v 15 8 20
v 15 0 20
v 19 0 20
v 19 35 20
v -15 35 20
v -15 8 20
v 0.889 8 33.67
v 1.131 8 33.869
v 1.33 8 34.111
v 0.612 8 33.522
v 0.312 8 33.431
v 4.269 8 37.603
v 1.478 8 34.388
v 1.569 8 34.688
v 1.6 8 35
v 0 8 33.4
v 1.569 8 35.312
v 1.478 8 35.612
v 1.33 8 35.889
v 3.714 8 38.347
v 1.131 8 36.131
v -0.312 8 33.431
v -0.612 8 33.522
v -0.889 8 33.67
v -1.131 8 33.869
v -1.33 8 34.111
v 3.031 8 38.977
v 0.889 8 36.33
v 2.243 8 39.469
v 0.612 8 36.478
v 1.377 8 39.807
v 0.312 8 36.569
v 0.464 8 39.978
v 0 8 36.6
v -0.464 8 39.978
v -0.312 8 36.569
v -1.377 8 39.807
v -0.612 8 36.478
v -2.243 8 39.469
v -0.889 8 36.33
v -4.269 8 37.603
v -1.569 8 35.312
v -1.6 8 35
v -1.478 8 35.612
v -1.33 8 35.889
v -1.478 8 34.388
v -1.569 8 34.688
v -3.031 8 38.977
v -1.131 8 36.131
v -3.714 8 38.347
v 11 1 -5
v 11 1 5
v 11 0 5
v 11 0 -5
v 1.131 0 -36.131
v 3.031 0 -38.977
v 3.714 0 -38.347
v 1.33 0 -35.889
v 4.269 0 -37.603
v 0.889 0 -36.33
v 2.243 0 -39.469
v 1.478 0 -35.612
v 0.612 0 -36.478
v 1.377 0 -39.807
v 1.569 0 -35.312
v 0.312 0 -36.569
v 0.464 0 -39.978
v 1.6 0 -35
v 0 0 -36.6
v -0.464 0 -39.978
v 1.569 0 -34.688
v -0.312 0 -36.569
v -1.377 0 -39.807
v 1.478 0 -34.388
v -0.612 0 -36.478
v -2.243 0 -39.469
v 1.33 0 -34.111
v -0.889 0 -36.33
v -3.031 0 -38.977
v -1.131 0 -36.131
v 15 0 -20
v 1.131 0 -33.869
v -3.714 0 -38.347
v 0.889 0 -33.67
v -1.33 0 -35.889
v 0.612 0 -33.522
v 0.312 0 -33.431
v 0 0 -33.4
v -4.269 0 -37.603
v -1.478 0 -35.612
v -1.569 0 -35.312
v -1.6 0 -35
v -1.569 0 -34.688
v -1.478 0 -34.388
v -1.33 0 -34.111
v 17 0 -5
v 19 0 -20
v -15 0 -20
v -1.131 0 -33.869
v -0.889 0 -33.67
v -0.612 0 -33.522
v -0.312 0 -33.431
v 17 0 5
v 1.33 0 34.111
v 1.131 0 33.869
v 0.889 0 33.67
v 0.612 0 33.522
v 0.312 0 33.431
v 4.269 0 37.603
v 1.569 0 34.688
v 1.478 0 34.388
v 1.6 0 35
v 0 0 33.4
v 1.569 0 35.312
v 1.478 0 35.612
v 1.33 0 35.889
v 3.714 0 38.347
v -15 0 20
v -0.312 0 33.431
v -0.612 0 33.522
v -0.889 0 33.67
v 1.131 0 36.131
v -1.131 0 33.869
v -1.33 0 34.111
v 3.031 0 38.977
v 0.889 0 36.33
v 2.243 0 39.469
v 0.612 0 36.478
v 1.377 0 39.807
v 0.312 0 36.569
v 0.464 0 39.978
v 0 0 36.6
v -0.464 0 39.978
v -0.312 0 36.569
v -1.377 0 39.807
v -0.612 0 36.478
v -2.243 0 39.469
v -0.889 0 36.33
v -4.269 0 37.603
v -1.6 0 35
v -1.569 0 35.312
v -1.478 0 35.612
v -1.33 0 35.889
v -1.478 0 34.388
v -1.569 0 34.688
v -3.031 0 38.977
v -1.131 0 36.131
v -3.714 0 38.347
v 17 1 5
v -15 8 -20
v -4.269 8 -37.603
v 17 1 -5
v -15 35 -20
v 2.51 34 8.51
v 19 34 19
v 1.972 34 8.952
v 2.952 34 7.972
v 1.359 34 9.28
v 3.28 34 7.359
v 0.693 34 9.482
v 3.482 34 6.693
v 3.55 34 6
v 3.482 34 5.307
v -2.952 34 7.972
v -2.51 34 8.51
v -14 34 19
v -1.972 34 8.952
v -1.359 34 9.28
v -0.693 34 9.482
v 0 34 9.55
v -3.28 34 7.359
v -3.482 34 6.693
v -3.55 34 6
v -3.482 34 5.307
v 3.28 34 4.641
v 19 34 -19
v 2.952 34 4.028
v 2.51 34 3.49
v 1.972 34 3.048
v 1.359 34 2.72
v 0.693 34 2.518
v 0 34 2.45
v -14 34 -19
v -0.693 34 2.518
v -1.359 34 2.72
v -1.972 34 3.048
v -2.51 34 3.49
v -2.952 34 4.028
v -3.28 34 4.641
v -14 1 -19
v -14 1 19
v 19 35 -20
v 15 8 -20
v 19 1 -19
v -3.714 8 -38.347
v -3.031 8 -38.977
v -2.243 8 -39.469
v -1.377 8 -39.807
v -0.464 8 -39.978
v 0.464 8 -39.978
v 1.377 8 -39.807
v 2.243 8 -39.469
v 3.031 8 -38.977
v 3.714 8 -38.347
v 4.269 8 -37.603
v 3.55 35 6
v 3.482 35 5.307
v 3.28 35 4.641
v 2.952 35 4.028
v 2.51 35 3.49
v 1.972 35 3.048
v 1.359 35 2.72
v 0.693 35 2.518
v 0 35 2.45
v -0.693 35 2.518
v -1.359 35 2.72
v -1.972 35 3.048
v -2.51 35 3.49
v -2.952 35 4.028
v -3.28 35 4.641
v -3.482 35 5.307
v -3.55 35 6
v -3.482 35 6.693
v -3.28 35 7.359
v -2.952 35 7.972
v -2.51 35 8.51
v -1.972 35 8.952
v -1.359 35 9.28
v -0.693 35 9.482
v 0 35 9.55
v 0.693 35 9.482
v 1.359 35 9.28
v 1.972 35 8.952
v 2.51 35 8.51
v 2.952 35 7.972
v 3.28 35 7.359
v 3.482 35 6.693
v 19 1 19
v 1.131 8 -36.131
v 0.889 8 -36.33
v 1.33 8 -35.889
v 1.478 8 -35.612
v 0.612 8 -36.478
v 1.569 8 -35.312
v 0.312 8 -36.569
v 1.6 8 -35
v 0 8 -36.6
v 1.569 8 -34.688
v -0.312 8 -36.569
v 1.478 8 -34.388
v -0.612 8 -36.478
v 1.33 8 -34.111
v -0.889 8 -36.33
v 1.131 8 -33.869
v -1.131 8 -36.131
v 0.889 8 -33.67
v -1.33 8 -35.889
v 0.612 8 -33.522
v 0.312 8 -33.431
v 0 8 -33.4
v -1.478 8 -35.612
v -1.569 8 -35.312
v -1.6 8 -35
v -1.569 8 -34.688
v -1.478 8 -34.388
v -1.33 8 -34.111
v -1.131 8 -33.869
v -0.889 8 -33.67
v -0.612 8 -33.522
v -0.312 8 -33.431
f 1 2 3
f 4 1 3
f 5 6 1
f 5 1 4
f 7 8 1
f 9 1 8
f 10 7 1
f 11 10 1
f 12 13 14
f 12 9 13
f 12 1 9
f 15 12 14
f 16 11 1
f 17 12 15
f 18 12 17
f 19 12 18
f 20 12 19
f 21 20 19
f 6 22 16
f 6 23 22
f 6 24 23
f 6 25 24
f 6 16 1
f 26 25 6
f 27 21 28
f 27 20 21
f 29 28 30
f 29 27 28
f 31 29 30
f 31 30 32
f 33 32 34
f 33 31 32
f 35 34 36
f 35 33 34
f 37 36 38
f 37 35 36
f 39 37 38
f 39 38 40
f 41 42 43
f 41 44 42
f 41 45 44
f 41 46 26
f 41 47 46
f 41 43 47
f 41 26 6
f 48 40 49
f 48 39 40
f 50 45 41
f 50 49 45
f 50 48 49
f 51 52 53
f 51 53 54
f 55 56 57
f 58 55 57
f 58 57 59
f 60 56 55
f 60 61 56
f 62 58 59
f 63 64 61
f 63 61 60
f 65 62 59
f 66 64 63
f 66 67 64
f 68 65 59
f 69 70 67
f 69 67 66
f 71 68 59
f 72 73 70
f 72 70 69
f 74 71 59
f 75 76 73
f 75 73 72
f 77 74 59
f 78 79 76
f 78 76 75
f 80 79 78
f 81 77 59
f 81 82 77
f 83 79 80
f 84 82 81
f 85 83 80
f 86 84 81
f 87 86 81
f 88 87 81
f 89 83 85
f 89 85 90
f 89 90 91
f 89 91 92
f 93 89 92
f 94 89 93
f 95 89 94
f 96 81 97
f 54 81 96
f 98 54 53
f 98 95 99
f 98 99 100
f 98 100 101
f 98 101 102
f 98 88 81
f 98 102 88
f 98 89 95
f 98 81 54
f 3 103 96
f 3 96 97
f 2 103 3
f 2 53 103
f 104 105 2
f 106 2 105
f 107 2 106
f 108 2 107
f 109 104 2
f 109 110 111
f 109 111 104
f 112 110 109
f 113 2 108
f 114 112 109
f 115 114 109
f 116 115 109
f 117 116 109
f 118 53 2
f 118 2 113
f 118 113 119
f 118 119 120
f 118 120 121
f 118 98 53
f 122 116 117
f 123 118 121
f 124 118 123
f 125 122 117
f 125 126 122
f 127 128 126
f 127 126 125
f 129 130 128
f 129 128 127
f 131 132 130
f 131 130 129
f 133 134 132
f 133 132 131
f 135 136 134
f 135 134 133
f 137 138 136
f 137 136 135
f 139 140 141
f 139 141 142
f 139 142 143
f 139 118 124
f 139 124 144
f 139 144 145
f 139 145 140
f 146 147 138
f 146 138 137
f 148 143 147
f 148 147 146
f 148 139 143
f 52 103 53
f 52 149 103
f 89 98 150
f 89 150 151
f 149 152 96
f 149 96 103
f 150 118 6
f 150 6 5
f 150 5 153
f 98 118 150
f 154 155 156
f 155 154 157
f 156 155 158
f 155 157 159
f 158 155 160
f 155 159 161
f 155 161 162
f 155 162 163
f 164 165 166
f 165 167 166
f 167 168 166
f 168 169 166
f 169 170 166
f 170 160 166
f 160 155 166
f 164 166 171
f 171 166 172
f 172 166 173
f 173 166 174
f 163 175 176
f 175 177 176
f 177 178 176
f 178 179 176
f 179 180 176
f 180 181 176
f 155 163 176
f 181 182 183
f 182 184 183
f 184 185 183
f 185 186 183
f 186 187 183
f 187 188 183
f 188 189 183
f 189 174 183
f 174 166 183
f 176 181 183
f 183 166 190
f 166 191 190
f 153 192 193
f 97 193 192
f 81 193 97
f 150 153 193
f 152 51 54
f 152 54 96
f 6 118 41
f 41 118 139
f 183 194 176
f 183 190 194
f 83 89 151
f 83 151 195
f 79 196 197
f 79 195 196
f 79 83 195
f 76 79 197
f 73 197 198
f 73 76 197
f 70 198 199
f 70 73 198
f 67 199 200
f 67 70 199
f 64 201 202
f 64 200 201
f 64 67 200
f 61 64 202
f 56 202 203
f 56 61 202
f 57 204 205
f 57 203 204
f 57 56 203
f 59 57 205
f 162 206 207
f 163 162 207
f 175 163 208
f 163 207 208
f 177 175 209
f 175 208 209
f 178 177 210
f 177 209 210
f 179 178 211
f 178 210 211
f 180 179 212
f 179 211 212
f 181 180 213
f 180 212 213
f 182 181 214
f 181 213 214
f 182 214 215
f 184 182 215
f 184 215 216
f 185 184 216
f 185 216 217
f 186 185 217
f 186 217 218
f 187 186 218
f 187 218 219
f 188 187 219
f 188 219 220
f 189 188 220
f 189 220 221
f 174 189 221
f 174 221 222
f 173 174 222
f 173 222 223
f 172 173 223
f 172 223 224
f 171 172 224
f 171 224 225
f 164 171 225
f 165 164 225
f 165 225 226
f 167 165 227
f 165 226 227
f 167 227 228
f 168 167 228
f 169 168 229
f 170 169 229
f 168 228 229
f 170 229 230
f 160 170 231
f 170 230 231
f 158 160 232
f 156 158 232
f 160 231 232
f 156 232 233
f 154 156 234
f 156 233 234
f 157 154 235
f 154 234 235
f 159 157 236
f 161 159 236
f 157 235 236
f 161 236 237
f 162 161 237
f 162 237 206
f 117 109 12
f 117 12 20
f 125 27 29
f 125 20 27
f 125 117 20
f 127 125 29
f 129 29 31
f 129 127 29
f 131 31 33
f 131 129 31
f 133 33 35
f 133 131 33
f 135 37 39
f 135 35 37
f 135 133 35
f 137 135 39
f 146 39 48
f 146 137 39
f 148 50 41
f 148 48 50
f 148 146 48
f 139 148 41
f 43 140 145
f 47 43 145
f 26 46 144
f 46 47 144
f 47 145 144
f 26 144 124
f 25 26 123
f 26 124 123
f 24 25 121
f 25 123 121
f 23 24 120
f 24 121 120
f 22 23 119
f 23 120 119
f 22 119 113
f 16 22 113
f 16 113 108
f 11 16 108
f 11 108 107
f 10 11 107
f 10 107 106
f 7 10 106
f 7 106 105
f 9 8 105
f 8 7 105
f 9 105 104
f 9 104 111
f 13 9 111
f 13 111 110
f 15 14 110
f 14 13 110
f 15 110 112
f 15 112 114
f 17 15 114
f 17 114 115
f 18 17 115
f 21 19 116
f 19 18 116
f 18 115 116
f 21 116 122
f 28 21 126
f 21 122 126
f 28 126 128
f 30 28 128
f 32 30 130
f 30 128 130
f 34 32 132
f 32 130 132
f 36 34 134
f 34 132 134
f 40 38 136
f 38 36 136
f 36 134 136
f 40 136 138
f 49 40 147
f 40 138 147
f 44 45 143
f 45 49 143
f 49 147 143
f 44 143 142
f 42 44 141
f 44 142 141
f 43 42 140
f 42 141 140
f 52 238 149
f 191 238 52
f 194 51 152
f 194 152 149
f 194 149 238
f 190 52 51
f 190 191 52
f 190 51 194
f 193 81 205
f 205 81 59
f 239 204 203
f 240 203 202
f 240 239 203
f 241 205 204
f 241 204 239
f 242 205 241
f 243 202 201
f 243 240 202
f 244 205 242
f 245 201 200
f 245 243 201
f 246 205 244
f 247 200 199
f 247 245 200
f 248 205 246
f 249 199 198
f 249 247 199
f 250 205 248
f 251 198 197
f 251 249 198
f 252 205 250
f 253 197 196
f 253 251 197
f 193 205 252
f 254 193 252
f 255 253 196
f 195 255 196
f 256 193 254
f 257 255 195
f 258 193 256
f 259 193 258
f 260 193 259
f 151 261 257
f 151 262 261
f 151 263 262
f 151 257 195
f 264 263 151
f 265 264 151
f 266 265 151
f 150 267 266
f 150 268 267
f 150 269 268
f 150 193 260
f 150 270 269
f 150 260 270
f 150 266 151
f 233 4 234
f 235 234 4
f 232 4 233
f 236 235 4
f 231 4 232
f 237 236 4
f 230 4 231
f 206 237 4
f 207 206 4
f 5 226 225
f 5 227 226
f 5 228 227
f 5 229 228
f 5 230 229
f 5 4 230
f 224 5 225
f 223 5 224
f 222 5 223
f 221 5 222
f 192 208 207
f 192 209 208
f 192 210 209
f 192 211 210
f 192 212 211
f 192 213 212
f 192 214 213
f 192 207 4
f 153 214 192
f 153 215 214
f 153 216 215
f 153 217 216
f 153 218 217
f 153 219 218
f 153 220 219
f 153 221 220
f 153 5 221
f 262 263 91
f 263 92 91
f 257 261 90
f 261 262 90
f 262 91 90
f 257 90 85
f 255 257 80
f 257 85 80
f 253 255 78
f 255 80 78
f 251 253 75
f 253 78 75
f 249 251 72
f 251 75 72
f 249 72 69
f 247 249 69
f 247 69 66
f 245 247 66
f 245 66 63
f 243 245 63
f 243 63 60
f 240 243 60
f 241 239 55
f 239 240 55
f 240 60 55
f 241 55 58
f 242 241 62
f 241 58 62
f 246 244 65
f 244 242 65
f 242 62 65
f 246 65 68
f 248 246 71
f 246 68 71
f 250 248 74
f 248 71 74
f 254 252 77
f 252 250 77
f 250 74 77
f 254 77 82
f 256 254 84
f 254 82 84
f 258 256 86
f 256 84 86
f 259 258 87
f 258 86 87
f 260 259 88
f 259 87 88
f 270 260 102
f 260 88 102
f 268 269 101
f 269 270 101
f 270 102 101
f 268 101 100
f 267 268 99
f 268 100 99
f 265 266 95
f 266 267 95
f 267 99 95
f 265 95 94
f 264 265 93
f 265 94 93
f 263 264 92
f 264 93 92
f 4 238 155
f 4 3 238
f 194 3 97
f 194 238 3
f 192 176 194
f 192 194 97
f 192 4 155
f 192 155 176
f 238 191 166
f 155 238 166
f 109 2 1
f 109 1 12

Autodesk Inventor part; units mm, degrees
ref_plane "YZ Plane" through (0, 0, 0) normal (1, 0, 0) x (0, 1, 0)
ref_plane "XZ Plane" through (0, 0, 0) normal (0, 1, 0) x (-1, 0, 0)
ref_plane "XY Plane" through (0, 0, 0) normal (0, 0, 1) x (1, 0, 0)
sketch "Sketch1" plane through (0, 0, 0) normal (0, 1, 0) x (-1, 0, 0)
  line L0 (-15, 20) -> (15, 20)
  line L1 (15, 20) -> (15, -20)
  line L2 (15, -20) -> (-15, -20)
  line L3 (-15, -20) -> (-15, 20)
  line L4 (-15, 20) -> (15, -20) construction
  line L5 (15, 20) -> (-15, -20) construction
  line L6 (0, 31.25) -> (0, -31.25)
  point P0 (0, 0)
  dimension "d0" = 30
  dimension "d1" = 40
  dimension "d2" = 62.5
  dimension "d3" = 18.75
extrude "Extrusion1" add sketch "Sketch1" along normal blind 35
shell "Shell1" thickness 1 removed faces 1 at (15, 11.6667, 6.6667)
sketch "Sketch3" plane through (0, 35, 0) normal (0, 1, 0) x (1, 0, 0)
  point P0 (0, 0)
sketch "Sketch4" plane through (0, 0, 0) normal (0, 1, 0) x (-1, 0, 0)
  arc A0 (-4.2693, -37.6026) -> (4.2693, -37.6026) centre (0, -35) ccw
  line L0 (-15, -20) -> (15, -20) projected
  line L1 (28.6058, 0) -> (-27.8274, 0)
  line L2 (15, -20) -> (15, 20) projected
  arc A1 (4.2693, 37.6026) -> (-4.2693, 37.6026) centre (0, 35) ccw
  line L3 (15, -20) -> (4.2693, -37.6026)
  line L4 (-15, -20) -> (-4.2693, -37.6026)
  line L5 (15, 20) -> (-15, 20) projected
  line L6 (-15, 20) -> (-4.2693, 37.6026)
  line L7 (15, 20) -> (4.2693, 37.6026)
  circle A2 centre (0, -35) radius 1.6
  circle A3 centre (0, 35) radius 1.6
  point P0 (0, 0)
  point P1 (0, -20)
  point P2 (0.3892, 0)
  point P3 (15, 0)
  dimension "d7" = 10
  dimension "d8" = 15
  dimension "d9" = 3.2
  dimension "d10" = 3.2
extrude "Extrusion2" add sketch "Sketch4" along normal blind 8
sketch "Sketch5" plane through (0, 35, 0) normal (0, 1, 0) x (1, 0, 0)
  circle A0 centre (0, -6) radius 3.55
  point P0 (0, 0)
  dimension "d15" = 7.1
  dimension "d16" = 6
extrude "Extrusion3" cut sketch "Sketch5" against normal blind 10
sketch "Sketch6" plane through (15, 0, 20) normal (1, 0, 0) x (0, 0, -1)
  point P0 (20, 0)
sketch "Sketch7" plane through (15, 35, 20) normal (1, 0, 0) x (0, 0, -1)
  line L0 (0, -27) -> (0, 0) projected
  line L1 (40, -35) -> (0, -35)
  line L2 (0, -35) -> (0, 0)
  line L3 (0, 0) -> (40, 0)
  line L4 (40, 0) -> (40, -35)
  line L5 (40, -35) -> (0, 0) construction
  line L6 (0, -35) -> (40, 0) construction
  line L7 (1, -34) -> (1, -1) projected
  line L8 (0, 0) -> (40, 0) projected
  line L9 (1, -1) -> (39, -1) projected
  line L10 (1, -34) -> (39, -34)
  line L11 (39, -34) -> (39, -1)
  line L12 (39, -1) -> (1, -1)
  line L13 (1, -1) -> (1, -34)
  line L14 (1, -34) -> (39, -1) construction
  line L15 (39, -34) -> (1, -1) construction
  point P0 (20, -35)
  point P1 (0, -25)
  point P2 (20, -17.5)
  point P3 (20, 0)
  point P4 (1, -17.5)
  point P5 (0, -17.5)
  point P6 (20, -35)
  point P7 (20, 0)
  point P8 (0, -25)
extrude "Extrusion4" add sketch "Sketch7" along normal blind 4
sketch "Sketch9" plane through (-14, 1, 19) normal (0, 1, 0) x (1, 0, 0)
  line L0 (25, 24) -> (31, 24)
  line L1 (31, 24) -> (31, 14)
  line L2 (31, 14) -> (25, 14)
  line L3 (25, 14) -> (25, 24)
  line L4 (25, 24) -> (31, 14) construction
  line L5 (31, 24) -> (25, 14) construction
  line L6 (33, 38) -> (33, 0) projected
  point P0 (14, 19)
  point P1 (28, 19)
  point P2 (33, 19)
  point P3 (33, 19)
  dimension "d25" = 6
  dimension "d26" = 10
  dimension "d27" = 5
extrude "Extrusion6" cut sketch "Sketch9" against normal through all
properties part number "SERVO BASE HOUSING_3DPrint"
